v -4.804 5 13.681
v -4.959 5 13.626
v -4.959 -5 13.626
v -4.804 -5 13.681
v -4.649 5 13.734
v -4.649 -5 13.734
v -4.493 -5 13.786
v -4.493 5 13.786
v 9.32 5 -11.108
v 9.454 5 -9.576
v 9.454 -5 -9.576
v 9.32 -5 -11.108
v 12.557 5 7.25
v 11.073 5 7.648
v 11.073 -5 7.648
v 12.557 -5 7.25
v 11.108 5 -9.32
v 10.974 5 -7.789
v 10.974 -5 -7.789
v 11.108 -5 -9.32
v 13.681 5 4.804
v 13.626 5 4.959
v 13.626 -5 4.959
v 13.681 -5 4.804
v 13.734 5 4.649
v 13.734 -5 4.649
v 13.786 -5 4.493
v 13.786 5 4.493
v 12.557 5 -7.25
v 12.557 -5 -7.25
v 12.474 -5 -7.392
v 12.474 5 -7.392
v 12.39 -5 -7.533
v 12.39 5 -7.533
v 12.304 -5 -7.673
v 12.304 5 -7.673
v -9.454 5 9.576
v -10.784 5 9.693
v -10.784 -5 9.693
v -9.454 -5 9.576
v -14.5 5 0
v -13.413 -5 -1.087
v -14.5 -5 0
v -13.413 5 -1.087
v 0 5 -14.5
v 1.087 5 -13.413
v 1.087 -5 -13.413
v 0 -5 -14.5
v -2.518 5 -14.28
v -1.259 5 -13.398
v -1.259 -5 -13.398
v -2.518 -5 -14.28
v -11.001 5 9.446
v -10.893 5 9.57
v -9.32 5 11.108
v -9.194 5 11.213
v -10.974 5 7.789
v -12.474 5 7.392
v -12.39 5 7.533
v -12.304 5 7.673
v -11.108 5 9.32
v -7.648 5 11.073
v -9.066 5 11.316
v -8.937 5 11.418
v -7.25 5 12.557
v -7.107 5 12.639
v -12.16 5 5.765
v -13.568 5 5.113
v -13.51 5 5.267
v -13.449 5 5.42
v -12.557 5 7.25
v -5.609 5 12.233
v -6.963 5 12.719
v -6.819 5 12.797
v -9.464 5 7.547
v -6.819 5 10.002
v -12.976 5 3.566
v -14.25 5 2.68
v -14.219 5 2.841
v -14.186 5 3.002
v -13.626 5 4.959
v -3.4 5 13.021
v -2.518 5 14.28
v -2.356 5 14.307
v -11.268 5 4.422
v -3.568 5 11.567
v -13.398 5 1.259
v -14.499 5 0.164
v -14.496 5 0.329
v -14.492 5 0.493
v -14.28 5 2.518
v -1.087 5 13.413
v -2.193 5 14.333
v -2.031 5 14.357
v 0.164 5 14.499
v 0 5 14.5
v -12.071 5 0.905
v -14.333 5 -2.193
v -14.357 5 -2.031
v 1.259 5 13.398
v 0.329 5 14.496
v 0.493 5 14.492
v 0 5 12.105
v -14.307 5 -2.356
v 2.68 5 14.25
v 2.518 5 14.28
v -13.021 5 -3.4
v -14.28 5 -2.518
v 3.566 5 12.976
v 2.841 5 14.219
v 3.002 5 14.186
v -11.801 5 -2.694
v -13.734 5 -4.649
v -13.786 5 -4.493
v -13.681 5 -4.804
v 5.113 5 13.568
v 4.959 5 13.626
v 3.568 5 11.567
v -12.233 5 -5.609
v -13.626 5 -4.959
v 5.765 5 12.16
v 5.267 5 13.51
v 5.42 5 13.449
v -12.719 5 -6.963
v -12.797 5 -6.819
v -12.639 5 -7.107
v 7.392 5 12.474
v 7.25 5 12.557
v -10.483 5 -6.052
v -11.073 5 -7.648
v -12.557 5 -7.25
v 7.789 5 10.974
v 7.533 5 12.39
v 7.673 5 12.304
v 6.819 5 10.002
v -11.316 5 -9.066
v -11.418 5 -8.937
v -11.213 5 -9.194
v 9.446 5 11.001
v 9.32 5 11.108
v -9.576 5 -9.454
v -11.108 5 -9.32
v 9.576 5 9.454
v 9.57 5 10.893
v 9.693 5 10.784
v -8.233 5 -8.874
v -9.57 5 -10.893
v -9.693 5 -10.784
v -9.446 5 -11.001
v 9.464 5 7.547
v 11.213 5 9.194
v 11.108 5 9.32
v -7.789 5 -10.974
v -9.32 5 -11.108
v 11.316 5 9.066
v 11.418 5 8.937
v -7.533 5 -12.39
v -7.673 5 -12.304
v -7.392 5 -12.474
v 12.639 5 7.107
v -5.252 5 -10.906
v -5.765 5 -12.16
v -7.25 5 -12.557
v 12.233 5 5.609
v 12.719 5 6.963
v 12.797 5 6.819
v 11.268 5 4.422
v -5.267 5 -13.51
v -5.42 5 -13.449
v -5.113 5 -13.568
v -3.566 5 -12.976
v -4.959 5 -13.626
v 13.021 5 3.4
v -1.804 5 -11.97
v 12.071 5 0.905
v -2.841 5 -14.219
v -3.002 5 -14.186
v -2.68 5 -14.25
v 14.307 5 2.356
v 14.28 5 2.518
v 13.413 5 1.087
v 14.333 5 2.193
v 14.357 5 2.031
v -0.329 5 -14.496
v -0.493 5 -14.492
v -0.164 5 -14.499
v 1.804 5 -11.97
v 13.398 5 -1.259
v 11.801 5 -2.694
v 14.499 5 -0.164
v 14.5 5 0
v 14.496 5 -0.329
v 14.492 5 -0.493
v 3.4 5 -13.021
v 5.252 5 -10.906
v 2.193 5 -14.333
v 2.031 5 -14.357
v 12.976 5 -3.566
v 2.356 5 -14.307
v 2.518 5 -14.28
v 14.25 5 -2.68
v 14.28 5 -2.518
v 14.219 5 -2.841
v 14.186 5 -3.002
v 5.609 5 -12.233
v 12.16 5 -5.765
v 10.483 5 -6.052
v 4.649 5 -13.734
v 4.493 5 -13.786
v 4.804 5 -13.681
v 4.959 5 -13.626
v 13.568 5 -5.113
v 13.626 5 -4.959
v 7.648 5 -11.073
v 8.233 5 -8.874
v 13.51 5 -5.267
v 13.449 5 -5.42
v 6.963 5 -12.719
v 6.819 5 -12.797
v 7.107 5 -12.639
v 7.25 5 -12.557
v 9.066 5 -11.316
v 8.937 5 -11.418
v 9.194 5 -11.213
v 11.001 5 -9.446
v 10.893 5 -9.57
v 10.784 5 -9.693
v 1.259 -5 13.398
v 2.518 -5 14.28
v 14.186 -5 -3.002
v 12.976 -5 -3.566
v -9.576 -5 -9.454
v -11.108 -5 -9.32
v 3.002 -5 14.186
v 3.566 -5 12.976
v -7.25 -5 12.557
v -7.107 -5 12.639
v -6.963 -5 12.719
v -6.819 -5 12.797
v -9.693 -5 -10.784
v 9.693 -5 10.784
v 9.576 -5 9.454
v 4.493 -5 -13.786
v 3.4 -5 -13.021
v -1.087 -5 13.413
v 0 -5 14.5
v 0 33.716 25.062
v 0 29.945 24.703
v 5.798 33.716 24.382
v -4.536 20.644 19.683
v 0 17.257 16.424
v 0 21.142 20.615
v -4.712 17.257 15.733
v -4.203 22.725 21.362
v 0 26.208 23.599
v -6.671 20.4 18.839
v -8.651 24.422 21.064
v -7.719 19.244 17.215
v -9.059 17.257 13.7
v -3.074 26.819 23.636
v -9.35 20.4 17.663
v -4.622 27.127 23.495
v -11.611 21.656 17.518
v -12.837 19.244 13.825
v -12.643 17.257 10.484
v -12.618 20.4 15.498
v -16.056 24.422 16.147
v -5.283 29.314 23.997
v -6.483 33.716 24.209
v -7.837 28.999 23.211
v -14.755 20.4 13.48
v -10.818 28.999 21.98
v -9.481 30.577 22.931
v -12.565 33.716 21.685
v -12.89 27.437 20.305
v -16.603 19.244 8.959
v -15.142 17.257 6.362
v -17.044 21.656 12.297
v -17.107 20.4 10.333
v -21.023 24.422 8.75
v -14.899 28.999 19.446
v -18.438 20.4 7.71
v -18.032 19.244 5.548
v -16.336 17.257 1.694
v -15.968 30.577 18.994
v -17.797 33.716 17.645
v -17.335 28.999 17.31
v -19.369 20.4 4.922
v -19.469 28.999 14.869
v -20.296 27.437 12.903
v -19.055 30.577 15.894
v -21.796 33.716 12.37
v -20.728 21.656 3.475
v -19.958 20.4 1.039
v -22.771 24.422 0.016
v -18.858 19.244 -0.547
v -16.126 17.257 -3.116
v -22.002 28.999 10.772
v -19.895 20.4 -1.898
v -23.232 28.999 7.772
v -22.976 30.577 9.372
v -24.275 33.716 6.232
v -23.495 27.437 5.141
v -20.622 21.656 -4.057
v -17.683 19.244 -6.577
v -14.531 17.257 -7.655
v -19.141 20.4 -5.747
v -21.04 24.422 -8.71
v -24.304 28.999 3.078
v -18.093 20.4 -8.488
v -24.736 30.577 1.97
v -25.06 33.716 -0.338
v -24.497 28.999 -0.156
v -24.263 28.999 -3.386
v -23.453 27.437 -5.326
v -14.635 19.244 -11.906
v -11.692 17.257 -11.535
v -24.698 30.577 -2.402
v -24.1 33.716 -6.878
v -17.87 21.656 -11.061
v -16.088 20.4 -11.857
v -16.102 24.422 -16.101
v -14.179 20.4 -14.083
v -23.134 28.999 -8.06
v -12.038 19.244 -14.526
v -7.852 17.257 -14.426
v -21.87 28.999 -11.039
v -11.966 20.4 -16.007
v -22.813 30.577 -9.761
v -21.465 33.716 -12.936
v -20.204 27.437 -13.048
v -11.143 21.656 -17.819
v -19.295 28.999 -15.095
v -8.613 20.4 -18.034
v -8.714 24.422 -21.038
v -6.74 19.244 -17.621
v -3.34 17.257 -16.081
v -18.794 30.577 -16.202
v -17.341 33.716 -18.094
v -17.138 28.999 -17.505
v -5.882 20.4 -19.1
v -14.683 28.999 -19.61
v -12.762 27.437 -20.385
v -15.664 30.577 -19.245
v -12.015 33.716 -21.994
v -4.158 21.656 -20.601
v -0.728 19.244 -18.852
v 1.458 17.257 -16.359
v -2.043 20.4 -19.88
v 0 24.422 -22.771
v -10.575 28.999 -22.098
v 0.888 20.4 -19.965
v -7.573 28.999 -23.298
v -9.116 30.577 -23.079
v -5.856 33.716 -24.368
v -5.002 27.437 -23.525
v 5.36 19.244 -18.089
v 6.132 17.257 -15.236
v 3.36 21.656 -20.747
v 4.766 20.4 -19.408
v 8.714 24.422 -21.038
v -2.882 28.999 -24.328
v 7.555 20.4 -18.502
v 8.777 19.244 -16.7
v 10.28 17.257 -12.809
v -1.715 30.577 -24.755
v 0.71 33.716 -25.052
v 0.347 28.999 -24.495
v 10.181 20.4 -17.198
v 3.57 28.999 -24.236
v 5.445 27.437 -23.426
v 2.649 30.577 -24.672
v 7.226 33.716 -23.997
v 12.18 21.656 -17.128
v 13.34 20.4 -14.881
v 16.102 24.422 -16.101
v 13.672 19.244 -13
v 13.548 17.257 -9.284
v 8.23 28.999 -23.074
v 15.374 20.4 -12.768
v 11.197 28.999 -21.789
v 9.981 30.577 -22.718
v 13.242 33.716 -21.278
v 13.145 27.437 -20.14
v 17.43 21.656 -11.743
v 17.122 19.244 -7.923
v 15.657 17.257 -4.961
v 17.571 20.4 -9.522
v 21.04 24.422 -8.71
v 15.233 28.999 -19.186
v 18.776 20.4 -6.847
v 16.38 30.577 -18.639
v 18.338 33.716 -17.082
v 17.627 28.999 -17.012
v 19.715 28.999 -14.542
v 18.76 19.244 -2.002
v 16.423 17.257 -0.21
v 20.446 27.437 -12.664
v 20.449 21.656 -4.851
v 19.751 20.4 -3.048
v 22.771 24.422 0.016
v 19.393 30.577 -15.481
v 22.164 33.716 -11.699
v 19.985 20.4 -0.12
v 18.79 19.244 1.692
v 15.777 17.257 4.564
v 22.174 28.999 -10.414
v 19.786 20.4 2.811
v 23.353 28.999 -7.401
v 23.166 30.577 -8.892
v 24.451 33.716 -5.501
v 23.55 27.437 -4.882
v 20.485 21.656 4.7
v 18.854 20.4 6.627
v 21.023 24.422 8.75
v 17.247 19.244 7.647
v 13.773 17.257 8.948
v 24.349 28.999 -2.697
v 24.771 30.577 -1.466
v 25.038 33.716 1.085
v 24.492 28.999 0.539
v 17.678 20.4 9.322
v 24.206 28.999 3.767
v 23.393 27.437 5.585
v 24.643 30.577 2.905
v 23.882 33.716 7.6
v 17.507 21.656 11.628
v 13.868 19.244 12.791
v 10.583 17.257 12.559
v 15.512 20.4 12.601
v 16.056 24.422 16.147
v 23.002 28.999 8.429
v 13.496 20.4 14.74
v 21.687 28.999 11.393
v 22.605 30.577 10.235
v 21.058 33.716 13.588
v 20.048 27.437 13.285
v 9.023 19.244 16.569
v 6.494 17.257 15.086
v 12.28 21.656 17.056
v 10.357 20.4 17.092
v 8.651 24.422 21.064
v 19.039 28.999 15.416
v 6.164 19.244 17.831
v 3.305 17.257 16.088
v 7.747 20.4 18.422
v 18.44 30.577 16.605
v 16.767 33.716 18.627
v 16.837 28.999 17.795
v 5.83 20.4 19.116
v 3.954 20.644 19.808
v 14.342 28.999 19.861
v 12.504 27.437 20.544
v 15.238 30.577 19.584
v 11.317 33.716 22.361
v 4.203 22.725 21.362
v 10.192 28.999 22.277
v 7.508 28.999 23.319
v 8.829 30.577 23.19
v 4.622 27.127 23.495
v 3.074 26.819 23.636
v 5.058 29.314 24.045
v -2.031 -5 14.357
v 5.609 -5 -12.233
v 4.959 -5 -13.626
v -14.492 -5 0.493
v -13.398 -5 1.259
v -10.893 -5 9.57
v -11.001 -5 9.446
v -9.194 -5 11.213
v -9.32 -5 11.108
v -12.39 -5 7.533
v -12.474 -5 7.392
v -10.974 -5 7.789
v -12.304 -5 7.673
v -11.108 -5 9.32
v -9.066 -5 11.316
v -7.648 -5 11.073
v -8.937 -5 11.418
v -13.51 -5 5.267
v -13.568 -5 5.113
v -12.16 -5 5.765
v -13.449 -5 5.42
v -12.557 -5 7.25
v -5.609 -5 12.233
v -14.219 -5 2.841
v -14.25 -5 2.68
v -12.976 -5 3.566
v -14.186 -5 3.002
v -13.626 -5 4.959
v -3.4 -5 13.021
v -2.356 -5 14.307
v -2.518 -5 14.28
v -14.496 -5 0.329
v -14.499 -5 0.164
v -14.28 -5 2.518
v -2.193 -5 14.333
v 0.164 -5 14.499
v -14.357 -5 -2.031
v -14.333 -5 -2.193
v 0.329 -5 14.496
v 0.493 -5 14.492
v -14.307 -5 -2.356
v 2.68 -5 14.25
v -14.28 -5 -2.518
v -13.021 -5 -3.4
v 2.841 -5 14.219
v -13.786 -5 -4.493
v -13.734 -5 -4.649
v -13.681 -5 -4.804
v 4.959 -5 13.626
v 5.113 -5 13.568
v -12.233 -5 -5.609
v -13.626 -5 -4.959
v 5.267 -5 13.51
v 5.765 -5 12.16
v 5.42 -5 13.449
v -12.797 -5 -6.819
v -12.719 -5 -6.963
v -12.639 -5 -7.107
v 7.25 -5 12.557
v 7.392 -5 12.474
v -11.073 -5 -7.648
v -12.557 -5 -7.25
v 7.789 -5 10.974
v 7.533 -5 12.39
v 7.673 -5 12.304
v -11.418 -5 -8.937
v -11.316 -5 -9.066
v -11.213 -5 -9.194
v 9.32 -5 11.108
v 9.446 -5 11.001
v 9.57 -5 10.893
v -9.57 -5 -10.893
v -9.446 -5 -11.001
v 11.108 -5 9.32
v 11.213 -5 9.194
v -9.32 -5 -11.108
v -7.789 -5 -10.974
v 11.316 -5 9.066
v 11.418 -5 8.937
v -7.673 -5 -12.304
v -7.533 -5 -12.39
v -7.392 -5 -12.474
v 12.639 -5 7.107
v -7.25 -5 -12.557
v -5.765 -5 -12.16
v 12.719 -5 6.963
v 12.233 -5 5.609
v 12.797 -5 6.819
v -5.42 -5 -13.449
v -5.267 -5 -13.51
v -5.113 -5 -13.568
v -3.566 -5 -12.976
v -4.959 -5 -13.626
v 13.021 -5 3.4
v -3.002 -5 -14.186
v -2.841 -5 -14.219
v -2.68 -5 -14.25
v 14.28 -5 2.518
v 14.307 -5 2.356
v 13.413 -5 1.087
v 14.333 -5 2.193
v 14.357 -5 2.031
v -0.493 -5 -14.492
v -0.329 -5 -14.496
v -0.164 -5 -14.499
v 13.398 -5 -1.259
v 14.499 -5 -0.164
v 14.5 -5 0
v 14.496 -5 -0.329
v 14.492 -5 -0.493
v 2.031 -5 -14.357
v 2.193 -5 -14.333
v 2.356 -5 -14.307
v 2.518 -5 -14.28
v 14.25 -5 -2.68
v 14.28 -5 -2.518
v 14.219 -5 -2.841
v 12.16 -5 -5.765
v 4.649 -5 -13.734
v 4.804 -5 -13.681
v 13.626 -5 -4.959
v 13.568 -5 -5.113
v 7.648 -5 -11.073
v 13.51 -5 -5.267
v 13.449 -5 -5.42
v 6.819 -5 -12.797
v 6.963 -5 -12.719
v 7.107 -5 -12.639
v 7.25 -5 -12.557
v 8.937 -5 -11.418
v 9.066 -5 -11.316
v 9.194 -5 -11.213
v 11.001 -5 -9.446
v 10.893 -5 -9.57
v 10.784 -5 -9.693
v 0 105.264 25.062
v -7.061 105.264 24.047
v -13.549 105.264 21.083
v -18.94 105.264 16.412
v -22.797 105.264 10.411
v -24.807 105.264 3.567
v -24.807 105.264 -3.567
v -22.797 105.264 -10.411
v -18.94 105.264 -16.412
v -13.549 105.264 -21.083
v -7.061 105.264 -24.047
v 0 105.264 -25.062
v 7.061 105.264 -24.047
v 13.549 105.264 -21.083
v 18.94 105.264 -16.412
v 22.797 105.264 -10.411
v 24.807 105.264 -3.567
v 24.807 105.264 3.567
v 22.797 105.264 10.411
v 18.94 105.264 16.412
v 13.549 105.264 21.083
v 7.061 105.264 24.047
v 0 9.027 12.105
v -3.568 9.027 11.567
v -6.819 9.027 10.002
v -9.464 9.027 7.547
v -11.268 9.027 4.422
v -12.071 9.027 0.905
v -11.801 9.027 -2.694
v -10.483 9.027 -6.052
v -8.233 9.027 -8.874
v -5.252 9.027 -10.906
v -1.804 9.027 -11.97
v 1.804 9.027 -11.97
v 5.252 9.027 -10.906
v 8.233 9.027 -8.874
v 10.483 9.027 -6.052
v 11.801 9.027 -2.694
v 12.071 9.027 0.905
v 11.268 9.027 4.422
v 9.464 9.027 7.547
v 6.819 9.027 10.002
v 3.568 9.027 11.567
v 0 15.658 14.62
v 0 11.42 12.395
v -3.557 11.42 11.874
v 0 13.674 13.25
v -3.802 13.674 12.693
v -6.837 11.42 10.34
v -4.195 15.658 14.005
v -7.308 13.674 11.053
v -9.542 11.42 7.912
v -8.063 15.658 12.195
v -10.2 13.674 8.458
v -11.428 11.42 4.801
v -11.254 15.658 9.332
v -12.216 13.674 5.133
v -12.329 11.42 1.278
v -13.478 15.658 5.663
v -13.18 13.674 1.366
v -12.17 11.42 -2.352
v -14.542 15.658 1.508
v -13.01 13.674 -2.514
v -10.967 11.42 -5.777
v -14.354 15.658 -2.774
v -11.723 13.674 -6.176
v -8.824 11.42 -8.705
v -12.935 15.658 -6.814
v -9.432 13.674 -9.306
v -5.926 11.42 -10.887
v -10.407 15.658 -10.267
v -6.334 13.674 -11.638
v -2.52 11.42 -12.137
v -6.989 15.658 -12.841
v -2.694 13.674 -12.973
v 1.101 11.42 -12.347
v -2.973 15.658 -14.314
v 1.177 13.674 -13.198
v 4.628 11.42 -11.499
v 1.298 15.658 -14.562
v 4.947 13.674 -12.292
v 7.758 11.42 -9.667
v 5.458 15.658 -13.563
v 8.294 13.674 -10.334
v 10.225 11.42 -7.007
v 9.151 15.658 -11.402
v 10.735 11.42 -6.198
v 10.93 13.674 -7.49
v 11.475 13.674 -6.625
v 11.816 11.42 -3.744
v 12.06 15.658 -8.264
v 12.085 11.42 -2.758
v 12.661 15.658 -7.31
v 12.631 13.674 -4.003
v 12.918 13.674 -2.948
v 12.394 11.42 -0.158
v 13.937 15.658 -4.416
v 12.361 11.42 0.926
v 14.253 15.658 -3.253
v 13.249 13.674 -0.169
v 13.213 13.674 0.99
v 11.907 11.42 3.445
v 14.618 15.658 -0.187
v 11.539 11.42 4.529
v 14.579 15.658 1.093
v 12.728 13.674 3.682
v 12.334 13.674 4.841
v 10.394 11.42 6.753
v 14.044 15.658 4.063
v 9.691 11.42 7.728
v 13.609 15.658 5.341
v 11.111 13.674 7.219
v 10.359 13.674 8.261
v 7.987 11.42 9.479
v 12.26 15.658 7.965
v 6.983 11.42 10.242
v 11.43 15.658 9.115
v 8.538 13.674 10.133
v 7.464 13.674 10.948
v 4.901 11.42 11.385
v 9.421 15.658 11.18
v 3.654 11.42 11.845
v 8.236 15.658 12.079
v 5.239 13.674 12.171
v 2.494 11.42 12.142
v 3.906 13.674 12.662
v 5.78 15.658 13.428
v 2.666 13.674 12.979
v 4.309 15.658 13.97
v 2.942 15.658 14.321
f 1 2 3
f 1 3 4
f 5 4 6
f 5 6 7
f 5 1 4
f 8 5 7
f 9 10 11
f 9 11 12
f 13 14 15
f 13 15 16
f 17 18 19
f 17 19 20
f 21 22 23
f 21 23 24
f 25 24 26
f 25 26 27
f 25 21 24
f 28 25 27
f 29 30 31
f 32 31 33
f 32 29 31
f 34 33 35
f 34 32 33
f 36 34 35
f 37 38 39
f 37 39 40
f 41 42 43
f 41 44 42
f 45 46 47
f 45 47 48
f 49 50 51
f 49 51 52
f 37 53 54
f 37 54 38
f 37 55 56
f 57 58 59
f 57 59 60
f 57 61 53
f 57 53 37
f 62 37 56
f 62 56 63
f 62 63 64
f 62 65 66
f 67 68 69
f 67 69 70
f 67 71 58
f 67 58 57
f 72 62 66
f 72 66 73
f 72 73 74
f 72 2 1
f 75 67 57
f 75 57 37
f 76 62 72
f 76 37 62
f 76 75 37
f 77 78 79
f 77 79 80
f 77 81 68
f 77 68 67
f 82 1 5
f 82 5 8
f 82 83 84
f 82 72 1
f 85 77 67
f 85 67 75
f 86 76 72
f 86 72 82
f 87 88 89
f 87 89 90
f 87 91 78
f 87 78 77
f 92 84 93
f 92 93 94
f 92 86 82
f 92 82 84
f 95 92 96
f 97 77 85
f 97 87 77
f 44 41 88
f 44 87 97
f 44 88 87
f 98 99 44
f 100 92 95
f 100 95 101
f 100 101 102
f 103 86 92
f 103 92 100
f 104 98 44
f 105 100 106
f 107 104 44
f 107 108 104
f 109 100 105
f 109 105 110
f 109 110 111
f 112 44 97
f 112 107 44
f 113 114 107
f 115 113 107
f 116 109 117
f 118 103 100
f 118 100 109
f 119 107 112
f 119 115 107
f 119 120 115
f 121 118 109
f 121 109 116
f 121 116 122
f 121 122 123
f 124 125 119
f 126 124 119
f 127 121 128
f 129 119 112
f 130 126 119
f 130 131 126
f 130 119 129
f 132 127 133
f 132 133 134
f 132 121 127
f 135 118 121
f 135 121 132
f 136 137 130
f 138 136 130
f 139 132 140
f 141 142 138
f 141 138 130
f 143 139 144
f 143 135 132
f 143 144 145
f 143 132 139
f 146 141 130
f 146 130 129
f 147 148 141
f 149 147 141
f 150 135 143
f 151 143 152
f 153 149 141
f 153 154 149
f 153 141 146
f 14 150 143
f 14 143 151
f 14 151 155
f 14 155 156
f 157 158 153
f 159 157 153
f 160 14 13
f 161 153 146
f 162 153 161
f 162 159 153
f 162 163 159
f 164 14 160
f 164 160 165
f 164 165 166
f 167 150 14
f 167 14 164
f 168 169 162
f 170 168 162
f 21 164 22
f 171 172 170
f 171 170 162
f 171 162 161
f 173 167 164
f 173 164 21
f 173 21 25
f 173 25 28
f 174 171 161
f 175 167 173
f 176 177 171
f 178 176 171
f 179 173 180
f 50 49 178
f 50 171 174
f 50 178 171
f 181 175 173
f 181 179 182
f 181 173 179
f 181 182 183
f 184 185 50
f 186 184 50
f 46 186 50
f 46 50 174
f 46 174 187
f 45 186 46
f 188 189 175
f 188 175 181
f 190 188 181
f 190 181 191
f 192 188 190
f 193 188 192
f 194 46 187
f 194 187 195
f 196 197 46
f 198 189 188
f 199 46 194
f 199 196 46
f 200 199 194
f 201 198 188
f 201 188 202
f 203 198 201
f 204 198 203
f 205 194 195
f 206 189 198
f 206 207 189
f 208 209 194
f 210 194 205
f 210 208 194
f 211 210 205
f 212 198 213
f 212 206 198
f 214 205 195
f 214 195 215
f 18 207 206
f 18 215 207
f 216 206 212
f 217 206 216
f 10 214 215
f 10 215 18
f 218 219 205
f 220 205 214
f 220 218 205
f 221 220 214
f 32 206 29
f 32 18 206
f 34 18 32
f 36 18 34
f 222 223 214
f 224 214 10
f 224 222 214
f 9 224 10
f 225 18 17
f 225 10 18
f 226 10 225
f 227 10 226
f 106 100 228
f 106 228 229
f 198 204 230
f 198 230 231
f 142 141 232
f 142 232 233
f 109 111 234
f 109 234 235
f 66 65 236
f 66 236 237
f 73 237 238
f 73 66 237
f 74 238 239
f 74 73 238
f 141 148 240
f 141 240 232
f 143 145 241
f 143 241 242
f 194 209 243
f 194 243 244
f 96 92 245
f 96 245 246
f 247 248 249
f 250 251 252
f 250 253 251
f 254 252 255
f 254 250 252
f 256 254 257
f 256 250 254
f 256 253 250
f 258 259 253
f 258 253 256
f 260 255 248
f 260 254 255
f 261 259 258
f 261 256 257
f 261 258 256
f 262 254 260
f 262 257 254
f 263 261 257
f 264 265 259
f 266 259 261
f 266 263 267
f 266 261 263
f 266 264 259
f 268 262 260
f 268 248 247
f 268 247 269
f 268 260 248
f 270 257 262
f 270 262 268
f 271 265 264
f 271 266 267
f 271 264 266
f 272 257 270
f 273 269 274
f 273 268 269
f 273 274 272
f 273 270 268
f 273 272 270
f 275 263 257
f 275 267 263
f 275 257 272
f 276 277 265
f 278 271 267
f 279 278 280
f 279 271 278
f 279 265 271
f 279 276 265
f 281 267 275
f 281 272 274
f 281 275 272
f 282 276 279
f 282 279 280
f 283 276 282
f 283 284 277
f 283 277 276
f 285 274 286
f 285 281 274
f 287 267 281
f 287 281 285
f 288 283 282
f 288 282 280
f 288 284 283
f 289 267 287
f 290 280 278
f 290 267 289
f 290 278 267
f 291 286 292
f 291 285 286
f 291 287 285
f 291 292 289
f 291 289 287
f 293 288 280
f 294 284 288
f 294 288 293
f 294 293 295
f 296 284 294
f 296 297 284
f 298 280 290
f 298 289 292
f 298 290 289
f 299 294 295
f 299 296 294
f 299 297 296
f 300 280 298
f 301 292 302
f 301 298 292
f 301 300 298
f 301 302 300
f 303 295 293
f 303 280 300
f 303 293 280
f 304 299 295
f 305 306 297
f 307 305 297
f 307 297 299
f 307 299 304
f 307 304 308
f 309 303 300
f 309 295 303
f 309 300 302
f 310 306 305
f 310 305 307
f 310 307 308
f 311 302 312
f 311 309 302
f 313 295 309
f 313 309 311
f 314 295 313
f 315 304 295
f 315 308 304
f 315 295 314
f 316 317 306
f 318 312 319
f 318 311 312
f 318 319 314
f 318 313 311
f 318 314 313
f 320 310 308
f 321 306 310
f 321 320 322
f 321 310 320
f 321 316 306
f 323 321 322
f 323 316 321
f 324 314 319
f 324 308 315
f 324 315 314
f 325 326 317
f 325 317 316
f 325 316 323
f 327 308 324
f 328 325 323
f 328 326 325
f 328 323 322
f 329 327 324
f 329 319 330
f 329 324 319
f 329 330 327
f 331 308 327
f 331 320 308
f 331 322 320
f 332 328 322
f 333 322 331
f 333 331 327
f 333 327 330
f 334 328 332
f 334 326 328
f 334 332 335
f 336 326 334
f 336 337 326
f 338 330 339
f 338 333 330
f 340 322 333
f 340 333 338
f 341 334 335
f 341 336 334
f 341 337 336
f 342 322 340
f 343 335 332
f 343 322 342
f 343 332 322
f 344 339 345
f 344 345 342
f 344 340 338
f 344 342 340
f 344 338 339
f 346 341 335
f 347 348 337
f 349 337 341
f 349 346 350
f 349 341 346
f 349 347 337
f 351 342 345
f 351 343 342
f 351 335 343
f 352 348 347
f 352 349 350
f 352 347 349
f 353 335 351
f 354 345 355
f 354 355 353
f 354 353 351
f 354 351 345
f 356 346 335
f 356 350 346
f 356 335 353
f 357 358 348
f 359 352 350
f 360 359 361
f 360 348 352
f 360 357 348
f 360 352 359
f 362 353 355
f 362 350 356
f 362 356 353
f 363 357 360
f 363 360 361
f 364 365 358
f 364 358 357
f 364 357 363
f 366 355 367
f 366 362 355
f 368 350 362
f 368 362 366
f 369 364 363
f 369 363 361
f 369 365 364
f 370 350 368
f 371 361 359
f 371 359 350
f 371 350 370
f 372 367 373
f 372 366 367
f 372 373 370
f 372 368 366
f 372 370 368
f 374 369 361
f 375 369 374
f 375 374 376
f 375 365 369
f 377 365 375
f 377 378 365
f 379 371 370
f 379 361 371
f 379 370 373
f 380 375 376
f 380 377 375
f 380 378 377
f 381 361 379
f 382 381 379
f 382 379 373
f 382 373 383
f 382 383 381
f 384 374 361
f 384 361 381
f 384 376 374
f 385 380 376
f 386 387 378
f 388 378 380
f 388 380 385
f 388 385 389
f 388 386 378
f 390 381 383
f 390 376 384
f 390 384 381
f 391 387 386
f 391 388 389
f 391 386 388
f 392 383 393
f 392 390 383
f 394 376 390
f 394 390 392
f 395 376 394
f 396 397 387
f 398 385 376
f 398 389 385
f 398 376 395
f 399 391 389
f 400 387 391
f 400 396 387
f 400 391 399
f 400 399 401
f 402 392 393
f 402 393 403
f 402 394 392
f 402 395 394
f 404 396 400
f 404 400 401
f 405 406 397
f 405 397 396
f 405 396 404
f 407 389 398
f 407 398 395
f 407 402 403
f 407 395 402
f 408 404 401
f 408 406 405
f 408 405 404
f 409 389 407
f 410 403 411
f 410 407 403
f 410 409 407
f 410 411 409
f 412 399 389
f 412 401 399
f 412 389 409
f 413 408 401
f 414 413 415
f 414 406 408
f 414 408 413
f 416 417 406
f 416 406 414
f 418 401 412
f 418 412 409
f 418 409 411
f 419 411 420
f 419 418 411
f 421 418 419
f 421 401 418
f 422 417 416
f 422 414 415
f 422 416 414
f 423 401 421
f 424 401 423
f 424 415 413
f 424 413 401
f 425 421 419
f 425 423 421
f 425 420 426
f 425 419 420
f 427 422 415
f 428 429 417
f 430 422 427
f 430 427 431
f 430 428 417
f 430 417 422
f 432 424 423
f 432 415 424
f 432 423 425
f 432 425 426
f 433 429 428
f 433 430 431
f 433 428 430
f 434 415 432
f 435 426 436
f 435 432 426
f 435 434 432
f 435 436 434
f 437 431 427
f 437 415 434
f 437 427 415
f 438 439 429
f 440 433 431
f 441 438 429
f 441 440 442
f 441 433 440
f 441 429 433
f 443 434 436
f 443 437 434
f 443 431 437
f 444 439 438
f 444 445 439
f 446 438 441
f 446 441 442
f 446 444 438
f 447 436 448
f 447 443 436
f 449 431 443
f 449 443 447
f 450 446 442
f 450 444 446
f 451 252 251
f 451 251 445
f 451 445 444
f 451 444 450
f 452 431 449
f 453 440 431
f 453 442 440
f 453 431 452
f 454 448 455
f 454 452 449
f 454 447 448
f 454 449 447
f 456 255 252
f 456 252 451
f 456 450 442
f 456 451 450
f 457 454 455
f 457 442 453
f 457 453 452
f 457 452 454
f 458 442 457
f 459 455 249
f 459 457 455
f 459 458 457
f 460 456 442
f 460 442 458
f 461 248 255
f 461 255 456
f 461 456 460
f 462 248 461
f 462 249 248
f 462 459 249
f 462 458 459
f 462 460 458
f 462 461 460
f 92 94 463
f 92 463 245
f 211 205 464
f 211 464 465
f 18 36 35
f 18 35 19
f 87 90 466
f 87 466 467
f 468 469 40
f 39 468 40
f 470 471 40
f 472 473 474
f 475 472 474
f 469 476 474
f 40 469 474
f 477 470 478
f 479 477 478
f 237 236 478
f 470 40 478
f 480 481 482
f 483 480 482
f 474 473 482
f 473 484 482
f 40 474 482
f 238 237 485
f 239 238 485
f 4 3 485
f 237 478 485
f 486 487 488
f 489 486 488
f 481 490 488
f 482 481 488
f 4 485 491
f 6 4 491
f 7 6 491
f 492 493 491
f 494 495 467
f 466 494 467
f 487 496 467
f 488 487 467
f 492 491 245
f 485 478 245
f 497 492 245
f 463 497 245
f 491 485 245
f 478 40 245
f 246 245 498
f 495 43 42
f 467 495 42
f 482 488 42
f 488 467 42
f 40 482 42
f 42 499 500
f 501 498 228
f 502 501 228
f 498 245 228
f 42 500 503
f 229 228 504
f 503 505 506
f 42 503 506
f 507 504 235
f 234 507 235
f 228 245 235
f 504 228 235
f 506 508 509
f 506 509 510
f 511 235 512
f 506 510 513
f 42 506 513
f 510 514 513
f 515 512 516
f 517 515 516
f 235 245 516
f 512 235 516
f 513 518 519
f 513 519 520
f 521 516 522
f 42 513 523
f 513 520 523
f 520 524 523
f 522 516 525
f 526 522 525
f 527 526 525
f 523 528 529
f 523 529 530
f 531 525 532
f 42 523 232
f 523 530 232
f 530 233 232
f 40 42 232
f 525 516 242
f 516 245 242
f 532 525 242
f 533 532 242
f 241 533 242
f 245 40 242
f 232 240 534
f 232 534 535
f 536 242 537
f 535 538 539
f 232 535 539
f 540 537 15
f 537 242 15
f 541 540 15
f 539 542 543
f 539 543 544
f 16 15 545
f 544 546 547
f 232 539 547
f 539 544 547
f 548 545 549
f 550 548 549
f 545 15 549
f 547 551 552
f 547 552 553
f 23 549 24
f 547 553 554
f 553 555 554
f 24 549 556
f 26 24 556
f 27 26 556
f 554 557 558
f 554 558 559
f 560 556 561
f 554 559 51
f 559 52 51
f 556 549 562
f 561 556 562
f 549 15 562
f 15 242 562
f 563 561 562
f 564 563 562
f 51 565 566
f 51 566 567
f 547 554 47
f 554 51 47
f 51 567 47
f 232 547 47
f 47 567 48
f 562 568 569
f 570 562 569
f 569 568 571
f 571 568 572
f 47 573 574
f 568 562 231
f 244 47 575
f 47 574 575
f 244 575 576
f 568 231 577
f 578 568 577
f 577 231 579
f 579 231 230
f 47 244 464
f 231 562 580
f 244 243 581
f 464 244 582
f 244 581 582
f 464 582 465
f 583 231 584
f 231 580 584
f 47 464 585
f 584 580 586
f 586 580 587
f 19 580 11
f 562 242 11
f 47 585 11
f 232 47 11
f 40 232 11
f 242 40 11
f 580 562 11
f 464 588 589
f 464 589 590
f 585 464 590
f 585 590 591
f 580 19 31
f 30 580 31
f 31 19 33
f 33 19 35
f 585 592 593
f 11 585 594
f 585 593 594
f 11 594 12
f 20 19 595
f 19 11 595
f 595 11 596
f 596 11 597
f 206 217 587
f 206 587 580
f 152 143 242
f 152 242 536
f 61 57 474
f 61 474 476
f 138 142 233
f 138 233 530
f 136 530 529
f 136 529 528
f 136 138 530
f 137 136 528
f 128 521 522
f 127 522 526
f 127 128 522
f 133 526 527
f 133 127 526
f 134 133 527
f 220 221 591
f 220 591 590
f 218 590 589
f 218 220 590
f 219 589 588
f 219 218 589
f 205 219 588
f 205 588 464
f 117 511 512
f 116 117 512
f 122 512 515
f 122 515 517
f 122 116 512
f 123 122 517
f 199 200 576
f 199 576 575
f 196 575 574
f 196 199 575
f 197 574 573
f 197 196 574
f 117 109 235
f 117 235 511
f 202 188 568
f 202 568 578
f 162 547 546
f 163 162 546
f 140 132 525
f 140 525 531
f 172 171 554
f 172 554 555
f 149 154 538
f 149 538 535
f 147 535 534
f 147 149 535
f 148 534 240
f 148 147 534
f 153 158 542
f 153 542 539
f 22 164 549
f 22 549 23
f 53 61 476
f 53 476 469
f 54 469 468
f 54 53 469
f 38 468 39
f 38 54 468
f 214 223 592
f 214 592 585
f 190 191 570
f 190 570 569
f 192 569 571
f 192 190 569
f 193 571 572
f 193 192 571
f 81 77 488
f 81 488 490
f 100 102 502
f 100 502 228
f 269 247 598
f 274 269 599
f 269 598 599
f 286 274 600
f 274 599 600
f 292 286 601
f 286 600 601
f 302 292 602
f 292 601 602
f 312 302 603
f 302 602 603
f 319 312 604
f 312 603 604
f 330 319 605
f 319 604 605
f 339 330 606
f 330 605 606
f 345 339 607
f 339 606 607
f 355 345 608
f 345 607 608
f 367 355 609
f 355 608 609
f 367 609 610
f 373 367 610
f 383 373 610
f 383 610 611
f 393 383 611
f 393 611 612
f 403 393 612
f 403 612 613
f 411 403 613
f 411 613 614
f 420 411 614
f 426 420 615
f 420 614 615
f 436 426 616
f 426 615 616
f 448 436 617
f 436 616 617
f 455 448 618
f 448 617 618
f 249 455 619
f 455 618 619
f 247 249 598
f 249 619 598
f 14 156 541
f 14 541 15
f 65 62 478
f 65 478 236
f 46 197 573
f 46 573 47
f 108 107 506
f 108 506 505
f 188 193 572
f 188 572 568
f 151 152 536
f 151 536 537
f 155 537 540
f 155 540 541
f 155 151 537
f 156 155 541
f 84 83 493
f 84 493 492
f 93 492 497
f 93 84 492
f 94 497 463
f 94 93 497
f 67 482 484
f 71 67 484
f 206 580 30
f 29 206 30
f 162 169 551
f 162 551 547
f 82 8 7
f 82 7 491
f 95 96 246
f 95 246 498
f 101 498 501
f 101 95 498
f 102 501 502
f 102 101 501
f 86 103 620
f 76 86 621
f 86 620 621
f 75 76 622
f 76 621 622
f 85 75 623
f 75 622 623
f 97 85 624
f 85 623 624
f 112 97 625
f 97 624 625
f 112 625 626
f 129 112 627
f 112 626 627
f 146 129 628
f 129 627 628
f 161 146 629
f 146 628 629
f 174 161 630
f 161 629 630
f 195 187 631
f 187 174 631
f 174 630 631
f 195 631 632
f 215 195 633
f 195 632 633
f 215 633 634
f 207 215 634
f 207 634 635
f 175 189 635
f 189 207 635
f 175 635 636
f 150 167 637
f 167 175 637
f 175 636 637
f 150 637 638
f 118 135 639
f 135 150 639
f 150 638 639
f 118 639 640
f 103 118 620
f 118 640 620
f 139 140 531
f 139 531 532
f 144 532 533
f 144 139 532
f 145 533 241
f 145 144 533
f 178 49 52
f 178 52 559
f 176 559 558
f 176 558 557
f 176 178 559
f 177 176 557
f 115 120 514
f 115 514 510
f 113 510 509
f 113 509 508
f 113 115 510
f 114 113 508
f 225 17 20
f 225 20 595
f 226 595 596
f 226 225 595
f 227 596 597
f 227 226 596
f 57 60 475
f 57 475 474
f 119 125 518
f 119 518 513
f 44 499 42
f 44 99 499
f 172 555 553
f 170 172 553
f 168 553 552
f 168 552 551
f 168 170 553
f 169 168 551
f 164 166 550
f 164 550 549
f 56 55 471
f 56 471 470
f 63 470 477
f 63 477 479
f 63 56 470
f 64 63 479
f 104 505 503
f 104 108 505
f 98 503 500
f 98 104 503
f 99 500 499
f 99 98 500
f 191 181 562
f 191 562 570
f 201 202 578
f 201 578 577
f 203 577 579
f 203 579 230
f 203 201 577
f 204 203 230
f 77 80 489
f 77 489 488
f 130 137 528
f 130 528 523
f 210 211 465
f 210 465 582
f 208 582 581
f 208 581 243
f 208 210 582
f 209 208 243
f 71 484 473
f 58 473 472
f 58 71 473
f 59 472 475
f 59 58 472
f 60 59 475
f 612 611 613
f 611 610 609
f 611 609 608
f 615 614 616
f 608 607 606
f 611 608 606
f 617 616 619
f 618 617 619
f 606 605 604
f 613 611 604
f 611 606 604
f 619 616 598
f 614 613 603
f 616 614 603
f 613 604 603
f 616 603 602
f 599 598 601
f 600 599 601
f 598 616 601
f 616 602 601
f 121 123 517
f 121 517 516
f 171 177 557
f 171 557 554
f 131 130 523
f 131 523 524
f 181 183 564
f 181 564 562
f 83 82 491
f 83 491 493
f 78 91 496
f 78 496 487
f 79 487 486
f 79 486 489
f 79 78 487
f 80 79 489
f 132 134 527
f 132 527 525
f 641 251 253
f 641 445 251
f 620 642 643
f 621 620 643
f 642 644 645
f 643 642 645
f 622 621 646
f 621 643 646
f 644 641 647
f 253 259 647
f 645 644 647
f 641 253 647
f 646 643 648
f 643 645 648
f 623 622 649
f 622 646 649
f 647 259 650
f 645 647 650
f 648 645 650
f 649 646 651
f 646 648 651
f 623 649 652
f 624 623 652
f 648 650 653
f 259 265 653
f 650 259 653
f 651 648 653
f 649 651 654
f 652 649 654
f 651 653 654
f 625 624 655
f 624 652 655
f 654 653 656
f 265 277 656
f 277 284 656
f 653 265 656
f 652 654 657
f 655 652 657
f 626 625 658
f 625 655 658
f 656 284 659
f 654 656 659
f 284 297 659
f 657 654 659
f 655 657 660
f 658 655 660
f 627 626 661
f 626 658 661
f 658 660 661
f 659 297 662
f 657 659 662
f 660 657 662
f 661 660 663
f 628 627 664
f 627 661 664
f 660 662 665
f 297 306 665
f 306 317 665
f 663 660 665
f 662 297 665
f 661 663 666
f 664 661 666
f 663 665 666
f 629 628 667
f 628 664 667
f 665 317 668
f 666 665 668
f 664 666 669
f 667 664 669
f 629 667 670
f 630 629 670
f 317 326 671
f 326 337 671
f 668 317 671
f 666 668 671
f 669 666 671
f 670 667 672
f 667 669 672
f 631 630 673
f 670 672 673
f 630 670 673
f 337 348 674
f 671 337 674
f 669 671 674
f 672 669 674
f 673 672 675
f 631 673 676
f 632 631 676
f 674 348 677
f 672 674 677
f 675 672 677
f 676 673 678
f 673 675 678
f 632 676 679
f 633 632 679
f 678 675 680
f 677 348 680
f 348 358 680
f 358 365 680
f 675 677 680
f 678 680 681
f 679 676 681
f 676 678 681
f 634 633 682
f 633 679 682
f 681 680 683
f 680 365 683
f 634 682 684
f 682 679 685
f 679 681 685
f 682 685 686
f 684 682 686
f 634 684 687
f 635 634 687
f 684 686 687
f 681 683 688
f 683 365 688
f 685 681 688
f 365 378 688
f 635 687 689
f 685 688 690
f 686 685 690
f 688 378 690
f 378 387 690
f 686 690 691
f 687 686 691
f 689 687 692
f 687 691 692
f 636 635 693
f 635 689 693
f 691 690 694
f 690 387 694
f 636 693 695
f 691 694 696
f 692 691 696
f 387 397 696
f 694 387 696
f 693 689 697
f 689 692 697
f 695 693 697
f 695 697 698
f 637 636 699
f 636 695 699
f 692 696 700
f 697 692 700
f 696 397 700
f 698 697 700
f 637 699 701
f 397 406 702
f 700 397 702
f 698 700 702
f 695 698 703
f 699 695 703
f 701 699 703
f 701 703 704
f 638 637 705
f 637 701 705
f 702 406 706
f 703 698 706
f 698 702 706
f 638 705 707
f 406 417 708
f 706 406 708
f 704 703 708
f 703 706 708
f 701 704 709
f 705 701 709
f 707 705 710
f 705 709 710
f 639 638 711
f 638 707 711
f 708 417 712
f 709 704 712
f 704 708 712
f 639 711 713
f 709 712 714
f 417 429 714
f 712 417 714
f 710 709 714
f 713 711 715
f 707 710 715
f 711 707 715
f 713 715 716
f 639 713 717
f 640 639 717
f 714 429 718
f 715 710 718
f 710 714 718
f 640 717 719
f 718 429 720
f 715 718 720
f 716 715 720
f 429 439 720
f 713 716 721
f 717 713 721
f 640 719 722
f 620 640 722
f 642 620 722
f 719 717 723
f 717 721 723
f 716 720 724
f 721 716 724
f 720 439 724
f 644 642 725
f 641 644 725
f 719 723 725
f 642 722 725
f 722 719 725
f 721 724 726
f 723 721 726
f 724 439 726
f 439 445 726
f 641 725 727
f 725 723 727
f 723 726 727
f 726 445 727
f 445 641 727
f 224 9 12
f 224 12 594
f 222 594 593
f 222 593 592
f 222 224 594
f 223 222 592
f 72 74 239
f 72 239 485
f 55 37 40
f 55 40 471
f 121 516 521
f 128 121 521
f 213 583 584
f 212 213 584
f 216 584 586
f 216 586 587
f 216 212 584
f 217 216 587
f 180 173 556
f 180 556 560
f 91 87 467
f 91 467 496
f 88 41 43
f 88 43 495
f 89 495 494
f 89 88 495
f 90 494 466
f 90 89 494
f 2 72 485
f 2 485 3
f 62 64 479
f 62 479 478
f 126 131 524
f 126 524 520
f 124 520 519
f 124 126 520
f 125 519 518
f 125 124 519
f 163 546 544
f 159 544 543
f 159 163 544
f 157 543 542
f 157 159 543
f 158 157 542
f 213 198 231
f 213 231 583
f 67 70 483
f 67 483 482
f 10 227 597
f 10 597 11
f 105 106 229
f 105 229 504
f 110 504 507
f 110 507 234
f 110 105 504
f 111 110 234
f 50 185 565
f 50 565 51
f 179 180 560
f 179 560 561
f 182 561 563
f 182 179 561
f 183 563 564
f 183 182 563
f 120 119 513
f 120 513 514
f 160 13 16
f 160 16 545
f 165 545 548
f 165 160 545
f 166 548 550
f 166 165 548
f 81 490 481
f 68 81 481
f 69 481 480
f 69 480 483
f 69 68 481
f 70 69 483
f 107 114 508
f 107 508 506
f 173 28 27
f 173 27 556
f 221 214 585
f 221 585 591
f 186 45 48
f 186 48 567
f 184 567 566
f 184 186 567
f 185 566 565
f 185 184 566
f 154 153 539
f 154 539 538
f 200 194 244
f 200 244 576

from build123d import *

# Parameters (mm, degrees)
BOSS_EXTRUDE1_DEPTH = 5
FILLET1_R           = 20


with BuildPart() as part:
    # Sketch1 → Boss-Extrude1 (new, symmetric)
    with BuildSketch(Plane(origin=(0, 0, 0), x_dir=(1, 0, 0), z_dir=(0, 1, 0))):
        with BuildLine():
            Line((-13.413143077, 1.086856923), (-14.5, 0))
            ThreePointArc((-14.5, 0), (-14.497902835, -0.246603683), (-14.491611948, -0.493136032))
            Line((-14.491611948, -0.493136032), (-13.398098019, -1.258822728))
            Line((-13.398098019, -1.258822728), (-14.279712419, -2.517898576))
            ThreePointArc((-14.279712419, -2.517898576), (-14.234824835, -2.760391626), (-14.185819627, -3.002086193))
            Line((-14.185819627, -3.002086193), (-12.975958532, -3.566253687))
            Line((-12.975958532, -3.566253687), (-13.625543001, -4.959292078))
            ThreePointArc((-13.625543001, -4.959292078), (-13.539228884, -5.190306466), (-13.448998355, -5.419819485))
            Line((-13.448998355, -5.419819485), (-12.159551111, -5.765325833))
            Line((-12.159551111, -5.765325833), (-12.557368355, -7.25))
            ThreePointArc((-12.557368355, -7.25), (-12.432250316, -7.462516471), (-12.303536073, -7.672874305))
            Line((-12.303536073, -7.672874305), (-10.973681883, -7.789221471))
            Line((-10.973681883, -7.789221471), (-11.107644425, -9.32042034))
            ThreePointArc((-11.107644425, -9.32042034), (-10.947524112, -9.50798169), (-10.784237074, -9.692792721))
            Line((-10.784237074, -9.692792721), (-9.454382883, -9.576445555))
            Line((-9.454382883, -9.576445555), (-9.32042034, -11.107644425))
            ThreePointArc((-9.32042034, -11.107644425), (-9.130162928, -11.264551696), (-8.937264488, -11.418200536))
            Line((-8.937264488, -11.418200536), (-7.647817244, -11.072694188))
            Line((-7.647817244, -11.072694188), (-7.25, -12.557368355))
            ThreePointArc((-7.25, -12.557368355), (-7.035386364, -12.678853998), (-6.818737643, -12.796672105))
            Line((-6.818737643, -12.796672105), (-5.608876548, -12.232504611))
            Line((-5.608876548, -12.232504611), (-4.959292078, -13.625543001))
            ThreePointArc((-4.959292078, -13.625543001), (-4.726843145, -13.707915738), (-4.493026906, -13.786323267))
            Line((-4.493026906, -13.786323267), (-3.399512976, -13.020636571))
            Line((-3.399512976, -13.020636571), (-2.517898576, -14.279712419))
            ThreePointArc((-2.517898576, -14.279712419), (-2.274677189, -14.320469395), (-2.030797819, -14.357083973))
            Line((-2.030797819, -14.357083973), (-1.086856923, -13.413143077))
            Line((-1.086856923, -13.413143077), (0, -14.5))
            ThreePointArc((0, -14.5), (0.246603683, -14.497902835), (0.493136032, -14.491611948))
            Line((0.493136032, -14.491611948), (1.258822728, -13.398098019))
            Line((1.258822728, -13.398098019), (2.517898576, -14.279712419))
            ThreePointArc((2.517898576, -14.279712419), (2.760391626, -14.234824835), (3.002086193, -14.185819627))
            Line((3.002086193, -14.185819627), (3.566253687, -12.975958532))
            Line((3.566253687, -12.975958532), (4.959292078, -13.625543001))
            ThreePointArc((4.959292078, -13.625543001), (5.190306466, -13.539228884), (5.419819485, -13.448998355))
            Line((5.419819485, -13.448998355), (5.765325833, -12.159551111))
            Line((5.765325833, -12.159551111), (7.25, -12.557368355))
            ThreePointArc((7.25, -12.557368355), (7.462516471, -12.432250316), (7.672874305, -12.303536073))
            Line((7.672874305, -12.303536073), (7.789221471, -10.973681883))
            Line((7.789221471, -10.973681883), (9.32042034, -11.107644425))
            ThreePointArc((9.32042034, -11.107644425), (9.50798169, -10.947524112), (9.692792721, -10.784237074))
            Line((9.692792721, -10.784237074), (9.576445555, -9.454382883))
            Line((9.576445555, -9.454382883), (11.107644425, -9.32042034))
            ThreePointArc((11.107644425, -9.32042034), (11.264551696, -9.130162928), (11.418200536, -8.937264488))
            Line((11.418200536, -8.937264488), (11.072694188, -7.647817244))
            Line((11.072694188, -7.647817244), (12.557368355, -7.25))
            ThreePointArc((12.557368355, -7.25), (12.678853998, -7.035386364), (12.796672105, -6.818737643))
            Line((12.796672105, -6.818737643), (12.232504611, -5.608876548))
            Line((12.232504611, -5.608876548), (13.625543001, -4.959292078))
            ThreePointArc((13.625543001, -4.959292078), (13.707915738, -4.726843145), (13.786323267, -4.493026906))
            Line((13.786323267, -4.493026906), (13.020636571, -3.399512976))
            Line((13.020636571, -3.399512976), (14.279712419, -2.517898576))
            ThreePointArc((14.279712419, -2.517898576), (14.320469395, -2.274677189), (14.357083973, -2.030797819))
            Line((14.357083973, -2.030797819), (13.413143077, -1.086856923))
            Line((13.413143077, -1.086856923), (14.5, 0))
            ThreePointArc((14.5, 0), (14.497902835, 0.246603683), (14.491611948, 0.493136032))
            Line((14.491611948, 0.493136032), (13.398098019, 1.258822728))
            Line((13.398098019, 1.258822728), (14.279712419, 2.517898576))
            ThreePointArc((14.279712419, 2.517898576), (14.234824835, 2.760391626), (14.185819627, 3.002086193))
            Line((14.185819627, 3.002086193), (12.975958532, 3.566253687))
            Line((12.975958532, 3.566253687), (13.625543001, 4.959292078))
            ThreePointArc((13.625543001, 4.959292078), (13.539228884, 5.190306466), (13.448998355, 5.419819485))
            Line((13.448998355, 5.419819485), (12.159551111, 5.765325833))
            Line((12.159551111, 5.765325833), (12.557368355, 7.25))
            ThreePointArc((12.557368355, 7.25), (12.432250316, 7.462516471), (12.303536073, 7.672874305))
            Line((12.303536073, 7.672874305), (10.973681883, 7.789221471))
            Line((10.973681883, 7.789221471), (11.107644425, 9.32042034))
            ThreePointArc((11.107644425, 9.32042034), (10.947524112, 9.50798169), (10.784237074, 9.692792721))
            Line((10.784237074, 9.692792721), (9.454382883, 9.576445555))
            Line((9.454382883, 9.576445555), (9.32042034, 11.107644425))
            ThreePointArc((9.32042034, 11.107644425), (9.130162928, 11.264551696), (8.937264488, 11.418200536))
            Line((8.937264488, 11.418200536), (7.647817244, 11.072694188))
            Line((7.647817244, 11.072694188), (7.25, 12.557368355))
            ThreePointArc((7.25, 12.557368355), (7.035386364, 12.678853998), (6.818737643, 12.796672105))
            Line((6.818737643, 12.796672105), (5.608876548, 12.232504611))
            Line((5.608876548, 12.232504611), (4.959292078, 13.625543001))
            ThreePointArc((4.959292078, 13.625543001), (4.726843145, 13.707915738), (4.493026906, 13.786323267))
            Line((4.493026906, 13.786323267), (3.399512976, 13.020636571))
            Line((3.399512976, 13.020636571), (2.517898576, 14.279712419))
            ThreePointArc((2.517898576, 14.279712419), (2.274677189, 14.320469395), (2.030797819, 14.357083973))
            Line((2.030797819, 14.357083973), (1.086856923, 13.413143077))
            Line((1.086856923, 13.413143077), (0, 14.5))
            ThreePointArc((0, 14.5), (-0.246603683, 14.497902835), (-0.493136032, 14.491611948))
            Line((-0.493136032, 14.491611948), (-1.258822728, 13.398098019))
            Line((-1.258822728, 13.398098019), (-2.517898576, 14.279712419))
            ThreePointArc((-2.517898576, 14.279712419), (-2.760391626, 14.234824835), (-3.002086193, 14.185819627))
            Line((-3.002086193, 14.185819627), (-3.566253687, 12.975958532))
            Line((-3.566253687, 12.975958532), (-4.959292078, 13.625543001))
            ThreePointArc((-4.959292078, 13.625543001), (-5.190306466, 13.539228884), (-5.419819485, 13.448998355))
            Line((-5.419819485, 13.448998355), (-5.765325833, 12.159551111))
            Line((-5.765325833, 12.159551111), (-7.25, 12.557368355))
            ThreePointArc((-7.25, 12.557368355), (-7.462516471, 12.432250316), (-7.672874305, 12.303536073))
            Line((-7.672874305, 12.303536073), (-7.789221471, 10.973681883))
            Line((-7.789221471, 10.973681883), (-9.32042034, 11.107644425))
            ThreePointArc((-9.32042034, 11.107644425), (-9.50798169, 10.947524112), (-9.692792721, 10.784237074))
            Line((-9.692792721, 10.784237074), (-9.576445555, 9.454382883))
            Line((-9.576445555, 9.454382883), (-11.107644425, 9.32042034))
            ThreePointArc((-11.107644425, 9.32042034), (-11.264551696, 9.130162928), (-11.418200536, 8.937264488))
            Line((-11.418200536, 8.937264488), (-11.072694188, 7.647817244))
            Line((-11.072694188, 7.647817244), (-12.557368355, 7.25))
            ThreePointArc((-12.557368355, 7.25), (-12.678853998, 7.035386364), (-12.796672105, 6.818737643))
            Line((-12.796672105, 6.818737643), (-12.232504611, 5.608876548))
            Line((-12.232504611, 5.608876548), (-13.625543001, 4.959292078))
            ThreePointArc((-13.625543001, 4.959292078), (-13.707915738, 4.726843145), (-13.786323267, 4.493026906))
            Line((-13.786323267, 4.493026906), (-13.020636571, 3.399512976))
            Line((-13.020636571, 3.399512976), (-14.279712419, 2.517898576))
            ThreePointArc((-14.279712419, 2.517898576), (-14.320469395, 2.274677189), (-14.357083973, 2.030797819))
            Line((-14.357083973, 2.030797819), (-13.413143077, 1.086856923))
        make_face()
    extrude(amount=BOSS_EXTRUDE1_DEPTH, both=True)

    # Sketch2 → Revolve1 (revolve)
    with BuildSketch(Plane(origin=(0, 0, 0), x_dir=(0, 0, -1), z_dir=(1, 0, 0)), mode=Mode.PRIVATE) as revolve1_sk:
        with BuildLine():
            Line((22.10493006, 19.026987327), (25.061867778, 19.026987327))
            Line((25.061867778, 19.026987327), (25.061867778, 105.264393418))
            Line((25.061867778, 105.264393418), (0, 105.264393418))
            Line((0, 105.264393418), (0, 0))
            Line((0, 0), (12.10493006, 0))
            Line((12.10493006, 0), (12.10493006, 9.026987327))
            ThreePointArc((12.10493006, 9.026987327), (15.033862249, 16.098055139), (22.10493006, 19.026987327))
        make_face()
    revolve(revolve1_sk.sketch.rotate(Axis((0, 105.264393418, 0), (0, -1, 0)), 180), axis=Axis((0, 105.264393418, 0), (0, -1, 0)))

    # Fillet1
    fillet1_edges = [part.edges().sort_by_distance(p)[0] for p in [
        (0, 19.026987327, -25.061867778),
    ]]
    fillet(fillet1_edges, radius=FILLET1_R)


solid = part.part
